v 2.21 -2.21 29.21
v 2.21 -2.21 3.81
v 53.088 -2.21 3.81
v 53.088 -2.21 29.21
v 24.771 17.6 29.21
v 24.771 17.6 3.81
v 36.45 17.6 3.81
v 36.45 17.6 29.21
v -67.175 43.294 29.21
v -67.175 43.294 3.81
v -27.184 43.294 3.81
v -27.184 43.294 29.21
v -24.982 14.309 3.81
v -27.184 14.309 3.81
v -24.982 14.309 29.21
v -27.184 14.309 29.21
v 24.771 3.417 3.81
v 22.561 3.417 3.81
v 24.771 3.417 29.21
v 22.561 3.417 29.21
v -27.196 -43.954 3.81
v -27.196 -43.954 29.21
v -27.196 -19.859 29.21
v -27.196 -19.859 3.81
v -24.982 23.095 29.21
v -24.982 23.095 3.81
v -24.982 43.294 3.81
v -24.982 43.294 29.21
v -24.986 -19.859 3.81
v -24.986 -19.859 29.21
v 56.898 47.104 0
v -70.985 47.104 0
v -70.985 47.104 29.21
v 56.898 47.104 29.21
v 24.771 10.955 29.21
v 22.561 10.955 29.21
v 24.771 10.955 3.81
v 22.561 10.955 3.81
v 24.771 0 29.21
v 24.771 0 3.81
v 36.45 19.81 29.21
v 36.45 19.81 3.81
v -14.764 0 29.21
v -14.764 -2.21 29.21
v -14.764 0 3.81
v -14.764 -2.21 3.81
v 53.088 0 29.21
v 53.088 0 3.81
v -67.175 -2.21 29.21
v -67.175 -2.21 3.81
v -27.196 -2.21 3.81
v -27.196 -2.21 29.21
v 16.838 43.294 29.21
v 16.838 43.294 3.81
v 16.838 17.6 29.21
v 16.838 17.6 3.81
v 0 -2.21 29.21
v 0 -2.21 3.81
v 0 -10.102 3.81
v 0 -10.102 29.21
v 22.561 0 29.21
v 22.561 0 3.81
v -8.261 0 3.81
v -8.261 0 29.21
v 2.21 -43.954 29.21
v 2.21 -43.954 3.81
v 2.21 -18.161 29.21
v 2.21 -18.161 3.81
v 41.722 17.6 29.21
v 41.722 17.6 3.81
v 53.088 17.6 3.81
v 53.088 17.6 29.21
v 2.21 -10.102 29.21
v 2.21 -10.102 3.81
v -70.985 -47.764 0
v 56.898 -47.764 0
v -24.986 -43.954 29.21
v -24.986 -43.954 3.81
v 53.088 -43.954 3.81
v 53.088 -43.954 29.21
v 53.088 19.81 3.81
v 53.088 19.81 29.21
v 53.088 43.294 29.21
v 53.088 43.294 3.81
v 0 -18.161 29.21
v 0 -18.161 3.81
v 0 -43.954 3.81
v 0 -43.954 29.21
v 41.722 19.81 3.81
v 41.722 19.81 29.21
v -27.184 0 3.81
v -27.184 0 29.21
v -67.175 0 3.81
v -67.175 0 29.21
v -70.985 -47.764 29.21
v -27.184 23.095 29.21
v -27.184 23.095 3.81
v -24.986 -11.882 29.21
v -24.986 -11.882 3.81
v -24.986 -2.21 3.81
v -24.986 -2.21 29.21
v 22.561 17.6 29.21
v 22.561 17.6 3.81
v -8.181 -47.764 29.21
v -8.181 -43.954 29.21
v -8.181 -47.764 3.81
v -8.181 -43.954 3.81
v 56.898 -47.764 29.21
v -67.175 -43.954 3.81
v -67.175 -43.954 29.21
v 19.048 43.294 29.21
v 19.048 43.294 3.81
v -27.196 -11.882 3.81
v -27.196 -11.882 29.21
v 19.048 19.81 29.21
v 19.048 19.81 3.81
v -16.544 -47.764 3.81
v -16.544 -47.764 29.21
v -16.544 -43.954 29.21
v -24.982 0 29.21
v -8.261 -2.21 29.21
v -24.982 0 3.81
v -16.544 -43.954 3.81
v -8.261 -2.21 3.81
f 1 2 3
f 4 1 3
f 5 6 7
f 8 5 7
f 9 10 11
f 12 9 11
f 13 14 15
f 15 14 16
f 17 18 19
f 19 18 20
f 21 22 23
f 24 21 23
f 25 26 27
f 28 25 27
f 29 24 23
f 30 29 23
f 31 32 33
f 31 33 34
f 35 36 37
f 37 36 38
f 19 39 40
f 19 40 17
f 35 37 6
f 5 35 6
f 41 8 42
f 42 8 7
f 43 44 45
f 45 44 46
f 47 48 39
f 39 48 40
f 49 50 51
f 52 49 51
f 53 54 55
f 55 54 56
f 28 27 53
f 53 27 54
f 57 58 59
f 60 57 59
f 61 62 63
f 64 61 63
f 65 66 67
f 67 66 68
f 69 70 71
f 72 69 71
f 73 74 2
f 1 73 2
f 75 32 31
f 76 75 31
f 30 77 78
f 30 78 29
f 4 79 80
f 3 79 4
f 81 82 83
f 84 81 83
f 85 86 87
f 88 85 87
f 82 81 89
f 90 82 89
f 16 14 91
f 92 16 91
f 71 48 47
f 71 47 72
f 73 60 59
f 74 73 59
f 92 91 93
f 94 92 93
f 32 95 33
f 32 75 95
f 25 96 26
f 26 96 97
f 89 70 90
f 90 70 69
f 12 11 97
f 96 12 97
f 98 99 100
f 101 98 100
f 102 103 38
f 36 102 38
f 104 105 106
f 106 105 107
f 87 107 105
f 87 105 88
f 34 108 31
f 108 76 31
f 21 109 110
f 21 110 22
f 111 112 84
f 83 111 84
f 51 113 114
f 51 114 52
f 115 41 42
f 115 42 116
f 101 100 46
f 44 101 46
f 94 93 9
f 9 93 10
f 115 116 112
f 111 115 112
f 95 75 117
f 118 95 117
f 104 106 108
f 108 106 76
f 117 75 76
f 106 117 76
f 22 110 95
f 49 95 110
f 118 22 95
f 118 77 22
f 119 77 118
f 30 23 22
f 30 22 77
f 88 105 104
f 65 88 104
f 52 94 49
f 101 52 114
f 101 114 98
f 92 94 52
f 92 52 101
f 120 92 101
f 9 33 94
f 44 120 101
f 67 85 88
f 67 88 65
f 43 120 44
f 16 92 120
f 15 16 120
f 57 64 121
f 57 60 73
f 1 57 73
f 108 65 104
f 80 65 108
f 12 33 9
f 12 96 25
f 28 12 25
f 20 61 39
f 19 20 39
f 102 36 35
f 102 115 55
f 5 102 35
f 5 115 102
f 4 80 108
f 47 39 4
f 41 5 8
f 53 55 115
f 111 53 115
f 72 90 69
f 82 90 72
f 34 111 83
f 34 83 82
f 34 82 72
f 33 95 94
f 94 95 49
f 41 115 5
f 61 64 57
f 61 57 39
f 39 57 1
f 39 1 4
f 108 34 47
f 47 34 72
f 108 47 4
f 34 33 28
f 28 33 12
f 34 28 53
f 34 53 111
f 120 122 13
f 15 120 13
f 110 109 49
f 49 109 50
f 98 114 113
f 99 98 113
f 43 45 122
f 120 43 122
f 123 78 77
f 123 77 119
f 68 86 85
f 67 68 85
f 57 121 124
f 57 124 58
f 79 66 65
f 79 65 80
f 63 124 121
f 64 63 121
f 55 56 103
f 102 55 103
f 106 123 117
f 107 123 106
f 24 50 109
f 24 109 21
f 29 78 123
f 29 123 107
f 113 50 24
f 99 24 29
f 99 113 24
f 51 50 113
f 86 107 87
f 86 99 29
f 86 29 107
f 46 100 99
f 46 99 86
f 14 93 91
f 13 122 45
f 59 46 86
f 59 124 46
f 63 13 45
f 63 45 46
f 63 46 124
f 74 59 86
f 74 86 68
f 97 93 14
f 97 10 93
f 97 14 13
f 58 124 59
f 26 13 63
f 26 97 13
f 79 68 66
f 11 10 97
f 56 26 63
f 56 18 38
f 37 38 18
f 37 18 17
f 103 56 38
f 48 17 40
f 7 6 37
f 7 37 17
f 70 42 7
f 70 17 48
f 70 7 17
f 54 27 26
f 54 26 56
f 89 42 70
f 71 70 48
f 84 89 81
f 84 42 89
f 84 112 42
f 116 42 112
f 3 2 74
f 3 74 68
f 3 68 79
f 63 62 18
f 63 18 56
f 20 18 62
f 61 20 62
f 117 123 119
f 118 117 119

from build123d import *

# Parameters (mm, degrees)
F0_W      = 127.8839372098
F0_H      = 94.8674269021
F1_DEPTH  = 3.81
F2_W      = 127.8839372098
F2_H      = 94.8674269021
F2_W_2    = 120.2639372098
F2_H_2    = 87.2474269021
F3_DEPTH  = 25.4
F5_DEPTH  = 25.4
F6_W      = 2.2098
F6_H      = 41.744076617
F7_DEPTH  = 25.4
F9_DEPTH  = 25.4
F11_DEPTH = 25.4
F12_W     = 2.2098
F12_H     = 17.600103577
F13_DEPTH = 25.4
F14_W     = 2.2098
F14_H     = 23.4836467081
F15_DEPTH = 25.4
F17_DEPTH = 25.4
F19_DEPTH = 25.4
F21_DEPTH = 9.652
F23_DEPTH = 6.3754
F25_DEPTH = 11.43
F27_DEPTH = 11.43
F29_DEPTH = 10.414


with BuildPart() as f1:
    # F0 (on Top) → F1 (new body)
    with BuildSketch(Plane.XY):
        with Locations((-7.0435199887, -0.3301631659)):
            Rectangle(F0_W, F0_H)
    extrude(amount=F1_DEPTH)

    # F2 (on face) → F3 (join)
    with BuildSketch(Plane.XY.offset(3.81)):
        with Locations((-7.0435199887, -0.3301631659)):
            Rectangle(F2_W, F2_H)
        with Locations((-7.0435199887, -0.3301631659)):
            Rectangle(F2_W_2, F2_H_2, mode=Mode.SUBTRACT)
    extrude(amount=F3_DEPTH)

    # F4 (on face) → F5 (join)
    with BuildSketch(Plane.XY.offset(3.81)):
        Polygon((-24.9860885936, -2.2098), (-24.9860885936, 0), (-24.9824896455, 0), (-24.9824896455, 43.2935502851), (-27.1835904568, 43.2935502851), (-27.1835904568, 0), (-67.1754885936, 0), (-67.1754885936, -2.2098), align=None)
    extrude(amount=F5_DEPTH)

    # F6 (on face) → F7 (join)
    with BuildSketch(Plane.XY.offset(3.81)):
        with Locations((-26.0909885936, -23.0818383085)):
            Rectangle(F6_W, F6_H)
    extrude(amount=F7_DEPTH)

    # F8 (on face) → F9 (join)
    with BuildSketch(Plane.XY.offset(3.81)):
        Polygon((0, 0), (0, -43.953876617), (2.2098, -43.953876617), (2.2098, -2.2098), (53.0884486163, -2.2098), (53.0884486163, 0), align=None)
    extrude(amount=F9_DEPTH)

    # F10 (on face) → F11 (join)
    with BuildSketch(Plane.XY.offset(3.81)):
        Polygon((0, 0), (-24.9824896455, 0), (-26.9634798169, 0), (-26.9634798169, -2.2098), (-24.9860885936, -2.2098), (0, -2.2098), align=None)
    extrude(amount=F11_DEPTH)

    # F12 (on face) → F13 (join)
    with BuildSketch(Plane.XY.offset(3.81)):
        with Locations((23.6661800568, 8.8000517885)):
            Rectangle(F12_W, F12_H)
        Polygon((22.5612800568, 19.809903577), (22.5612800568, 17.600103577), (24.7710800568, 17.600103577), (53.0884486163, 17.600103577), (53.0884486163, 19.809903577), align=None)
    extrude(amount=F13_DEPTH)

    # F14 (on face) → F15 (join)
    with BuildSketch(Plane.XY.offset(3.81)):
        Polygon((53.0884486163, 17.600103577), (53.0884486163, 19.809903577), (19.0482183198, 19.809903577), (16.8384183198, 19.809903577), (16.8384183198, 17.600103577), align=None)
        with Locations((17.9433183198, 31.551726931)):
            Rectangle(F14_W, F14_H)
    extrude(amount=F15_DEPTH)

    # F16 (on face) → F17 (cut)
    with BuildSketch(Plane(origin=(0, -43.953876617, 0), x_dir=(-1, 0, 0), z_dir=(0, 1, 0))):
        Polygon((8.1807011738, 22.1107043326), (8.1807011738, 3.81), (16.5439341217, 3.81), (16.5439341217, 22.1107043326), (16.5439341217, 31.9952704012), (8.1807011738, 31.9952704012), align=None)
    extrude(amount=-F17_DEPTH, mode=Mode.SUBTRACT)

    # F18 (on face) → F19 (cut)
    with BuildSketch(Plane(origin=(0, 0, 0), x_dir=(0, -1, 0), z_dir=(-1, 0, 0))):
        Polygon((10.1021090522, 23.6382391304), (10.1021090522, 3.81), (18.1610379368, 3.81), (18.1610379368, 23.6382391304), (18.1610379368, 31.1116781086), (10.1021090522, 31.1116781086), align=None)
    extrude(amount=-F19_DEPTH, mode=Mode.SUBTRACT)

    # F20 (on face) → F21 (cut)
    with BuildSketch(Plane(origin=(-27.1958885936, 0, 0), x_dir=(0, -1, 0), z_dir=(-1, 0, 0))):
        Polygon((11.8822744116, 20.1589465141), (11.8822744116, 3.81), (19.8594387621, 3.81), (19.8594387621, 20.1589465141), (19.8594387621, 31.4402878284), (11.8822744116, 31.4402878284), align=None)
    extrude(amount=-F21_DEPTH, mode=Mode.SUBTRACT)

    # F22 (on face) → F23 (cut)
    with BuildSketch(Plane(origin=(-27.1835904568, 0, 0), x_dir=(0, -1, 0), z_dir=(-1, 0, 0))):
        Polygon((-23.0946410447, 19.9922583997), (-23.0946410447, 3.81), (-14.3088679761, 3.81), (-14.3088679761, 19.9922583997), (-14.3088679761, 32.4732325971), (-23.0946410447, 32.4732325971), align=None)
    extrude(amount=-F23_DEPTH, mode=Mode.SUBTRACT)

    # F24 (on face) → F25 (cut)
    with BuildSketch(Plane(origin=(22.5612800568, 0, 0), x_dir=(0, -1, 0), z_dir=(-1, 0, 0))):
        Polygon((-10.9547926113, 22.2612097859), (-10.9547926113, 3.81), (-3.4168059938, 3.81), (-3.4168059938, 22.2612097859), (-3.4168059938, 32.5798727572), (-10.9547926113, 32.5798727572), align=None)
    extrude(amount=-F25_DEPTH, mode=Mode.SUBTRACT)

    # F26 (on face) → F27 (cut)
    with BuildSketch(Plane.XZ.offset(-17.600103577)):
        Polygon((36.4499650896, 21.9316985458), (36.4499650896, 3.81), (41.7222119868, 3.81), (41.7222119868, 21.2429128587), (41.7222119868, 21.9316985458), (41.7222119868, 34.7188301384), (36.4499650896, 34.7188301384), align=None)
    extrude(amount=-F27_DEPTH, mode=Mode.SUBTRACT)

    # F28 (on face) → F29 (cut)
    with BuildSketch(Plane.XZ.offset(2.2098)):
        Polygon((-14.7642167285, 18.1317012757), (-14.7642167285, 3.81), (-8.2613723353, 3.81), (-8.2613723353, 18.1317012757), (-8.2613723353, 34.8567925394), (-14.7642167285, 34.8567925394), align=None)
    extrude(amount=-F29_DEPTH, mode=Mode.SUBTRACT)


solid = f1.part
